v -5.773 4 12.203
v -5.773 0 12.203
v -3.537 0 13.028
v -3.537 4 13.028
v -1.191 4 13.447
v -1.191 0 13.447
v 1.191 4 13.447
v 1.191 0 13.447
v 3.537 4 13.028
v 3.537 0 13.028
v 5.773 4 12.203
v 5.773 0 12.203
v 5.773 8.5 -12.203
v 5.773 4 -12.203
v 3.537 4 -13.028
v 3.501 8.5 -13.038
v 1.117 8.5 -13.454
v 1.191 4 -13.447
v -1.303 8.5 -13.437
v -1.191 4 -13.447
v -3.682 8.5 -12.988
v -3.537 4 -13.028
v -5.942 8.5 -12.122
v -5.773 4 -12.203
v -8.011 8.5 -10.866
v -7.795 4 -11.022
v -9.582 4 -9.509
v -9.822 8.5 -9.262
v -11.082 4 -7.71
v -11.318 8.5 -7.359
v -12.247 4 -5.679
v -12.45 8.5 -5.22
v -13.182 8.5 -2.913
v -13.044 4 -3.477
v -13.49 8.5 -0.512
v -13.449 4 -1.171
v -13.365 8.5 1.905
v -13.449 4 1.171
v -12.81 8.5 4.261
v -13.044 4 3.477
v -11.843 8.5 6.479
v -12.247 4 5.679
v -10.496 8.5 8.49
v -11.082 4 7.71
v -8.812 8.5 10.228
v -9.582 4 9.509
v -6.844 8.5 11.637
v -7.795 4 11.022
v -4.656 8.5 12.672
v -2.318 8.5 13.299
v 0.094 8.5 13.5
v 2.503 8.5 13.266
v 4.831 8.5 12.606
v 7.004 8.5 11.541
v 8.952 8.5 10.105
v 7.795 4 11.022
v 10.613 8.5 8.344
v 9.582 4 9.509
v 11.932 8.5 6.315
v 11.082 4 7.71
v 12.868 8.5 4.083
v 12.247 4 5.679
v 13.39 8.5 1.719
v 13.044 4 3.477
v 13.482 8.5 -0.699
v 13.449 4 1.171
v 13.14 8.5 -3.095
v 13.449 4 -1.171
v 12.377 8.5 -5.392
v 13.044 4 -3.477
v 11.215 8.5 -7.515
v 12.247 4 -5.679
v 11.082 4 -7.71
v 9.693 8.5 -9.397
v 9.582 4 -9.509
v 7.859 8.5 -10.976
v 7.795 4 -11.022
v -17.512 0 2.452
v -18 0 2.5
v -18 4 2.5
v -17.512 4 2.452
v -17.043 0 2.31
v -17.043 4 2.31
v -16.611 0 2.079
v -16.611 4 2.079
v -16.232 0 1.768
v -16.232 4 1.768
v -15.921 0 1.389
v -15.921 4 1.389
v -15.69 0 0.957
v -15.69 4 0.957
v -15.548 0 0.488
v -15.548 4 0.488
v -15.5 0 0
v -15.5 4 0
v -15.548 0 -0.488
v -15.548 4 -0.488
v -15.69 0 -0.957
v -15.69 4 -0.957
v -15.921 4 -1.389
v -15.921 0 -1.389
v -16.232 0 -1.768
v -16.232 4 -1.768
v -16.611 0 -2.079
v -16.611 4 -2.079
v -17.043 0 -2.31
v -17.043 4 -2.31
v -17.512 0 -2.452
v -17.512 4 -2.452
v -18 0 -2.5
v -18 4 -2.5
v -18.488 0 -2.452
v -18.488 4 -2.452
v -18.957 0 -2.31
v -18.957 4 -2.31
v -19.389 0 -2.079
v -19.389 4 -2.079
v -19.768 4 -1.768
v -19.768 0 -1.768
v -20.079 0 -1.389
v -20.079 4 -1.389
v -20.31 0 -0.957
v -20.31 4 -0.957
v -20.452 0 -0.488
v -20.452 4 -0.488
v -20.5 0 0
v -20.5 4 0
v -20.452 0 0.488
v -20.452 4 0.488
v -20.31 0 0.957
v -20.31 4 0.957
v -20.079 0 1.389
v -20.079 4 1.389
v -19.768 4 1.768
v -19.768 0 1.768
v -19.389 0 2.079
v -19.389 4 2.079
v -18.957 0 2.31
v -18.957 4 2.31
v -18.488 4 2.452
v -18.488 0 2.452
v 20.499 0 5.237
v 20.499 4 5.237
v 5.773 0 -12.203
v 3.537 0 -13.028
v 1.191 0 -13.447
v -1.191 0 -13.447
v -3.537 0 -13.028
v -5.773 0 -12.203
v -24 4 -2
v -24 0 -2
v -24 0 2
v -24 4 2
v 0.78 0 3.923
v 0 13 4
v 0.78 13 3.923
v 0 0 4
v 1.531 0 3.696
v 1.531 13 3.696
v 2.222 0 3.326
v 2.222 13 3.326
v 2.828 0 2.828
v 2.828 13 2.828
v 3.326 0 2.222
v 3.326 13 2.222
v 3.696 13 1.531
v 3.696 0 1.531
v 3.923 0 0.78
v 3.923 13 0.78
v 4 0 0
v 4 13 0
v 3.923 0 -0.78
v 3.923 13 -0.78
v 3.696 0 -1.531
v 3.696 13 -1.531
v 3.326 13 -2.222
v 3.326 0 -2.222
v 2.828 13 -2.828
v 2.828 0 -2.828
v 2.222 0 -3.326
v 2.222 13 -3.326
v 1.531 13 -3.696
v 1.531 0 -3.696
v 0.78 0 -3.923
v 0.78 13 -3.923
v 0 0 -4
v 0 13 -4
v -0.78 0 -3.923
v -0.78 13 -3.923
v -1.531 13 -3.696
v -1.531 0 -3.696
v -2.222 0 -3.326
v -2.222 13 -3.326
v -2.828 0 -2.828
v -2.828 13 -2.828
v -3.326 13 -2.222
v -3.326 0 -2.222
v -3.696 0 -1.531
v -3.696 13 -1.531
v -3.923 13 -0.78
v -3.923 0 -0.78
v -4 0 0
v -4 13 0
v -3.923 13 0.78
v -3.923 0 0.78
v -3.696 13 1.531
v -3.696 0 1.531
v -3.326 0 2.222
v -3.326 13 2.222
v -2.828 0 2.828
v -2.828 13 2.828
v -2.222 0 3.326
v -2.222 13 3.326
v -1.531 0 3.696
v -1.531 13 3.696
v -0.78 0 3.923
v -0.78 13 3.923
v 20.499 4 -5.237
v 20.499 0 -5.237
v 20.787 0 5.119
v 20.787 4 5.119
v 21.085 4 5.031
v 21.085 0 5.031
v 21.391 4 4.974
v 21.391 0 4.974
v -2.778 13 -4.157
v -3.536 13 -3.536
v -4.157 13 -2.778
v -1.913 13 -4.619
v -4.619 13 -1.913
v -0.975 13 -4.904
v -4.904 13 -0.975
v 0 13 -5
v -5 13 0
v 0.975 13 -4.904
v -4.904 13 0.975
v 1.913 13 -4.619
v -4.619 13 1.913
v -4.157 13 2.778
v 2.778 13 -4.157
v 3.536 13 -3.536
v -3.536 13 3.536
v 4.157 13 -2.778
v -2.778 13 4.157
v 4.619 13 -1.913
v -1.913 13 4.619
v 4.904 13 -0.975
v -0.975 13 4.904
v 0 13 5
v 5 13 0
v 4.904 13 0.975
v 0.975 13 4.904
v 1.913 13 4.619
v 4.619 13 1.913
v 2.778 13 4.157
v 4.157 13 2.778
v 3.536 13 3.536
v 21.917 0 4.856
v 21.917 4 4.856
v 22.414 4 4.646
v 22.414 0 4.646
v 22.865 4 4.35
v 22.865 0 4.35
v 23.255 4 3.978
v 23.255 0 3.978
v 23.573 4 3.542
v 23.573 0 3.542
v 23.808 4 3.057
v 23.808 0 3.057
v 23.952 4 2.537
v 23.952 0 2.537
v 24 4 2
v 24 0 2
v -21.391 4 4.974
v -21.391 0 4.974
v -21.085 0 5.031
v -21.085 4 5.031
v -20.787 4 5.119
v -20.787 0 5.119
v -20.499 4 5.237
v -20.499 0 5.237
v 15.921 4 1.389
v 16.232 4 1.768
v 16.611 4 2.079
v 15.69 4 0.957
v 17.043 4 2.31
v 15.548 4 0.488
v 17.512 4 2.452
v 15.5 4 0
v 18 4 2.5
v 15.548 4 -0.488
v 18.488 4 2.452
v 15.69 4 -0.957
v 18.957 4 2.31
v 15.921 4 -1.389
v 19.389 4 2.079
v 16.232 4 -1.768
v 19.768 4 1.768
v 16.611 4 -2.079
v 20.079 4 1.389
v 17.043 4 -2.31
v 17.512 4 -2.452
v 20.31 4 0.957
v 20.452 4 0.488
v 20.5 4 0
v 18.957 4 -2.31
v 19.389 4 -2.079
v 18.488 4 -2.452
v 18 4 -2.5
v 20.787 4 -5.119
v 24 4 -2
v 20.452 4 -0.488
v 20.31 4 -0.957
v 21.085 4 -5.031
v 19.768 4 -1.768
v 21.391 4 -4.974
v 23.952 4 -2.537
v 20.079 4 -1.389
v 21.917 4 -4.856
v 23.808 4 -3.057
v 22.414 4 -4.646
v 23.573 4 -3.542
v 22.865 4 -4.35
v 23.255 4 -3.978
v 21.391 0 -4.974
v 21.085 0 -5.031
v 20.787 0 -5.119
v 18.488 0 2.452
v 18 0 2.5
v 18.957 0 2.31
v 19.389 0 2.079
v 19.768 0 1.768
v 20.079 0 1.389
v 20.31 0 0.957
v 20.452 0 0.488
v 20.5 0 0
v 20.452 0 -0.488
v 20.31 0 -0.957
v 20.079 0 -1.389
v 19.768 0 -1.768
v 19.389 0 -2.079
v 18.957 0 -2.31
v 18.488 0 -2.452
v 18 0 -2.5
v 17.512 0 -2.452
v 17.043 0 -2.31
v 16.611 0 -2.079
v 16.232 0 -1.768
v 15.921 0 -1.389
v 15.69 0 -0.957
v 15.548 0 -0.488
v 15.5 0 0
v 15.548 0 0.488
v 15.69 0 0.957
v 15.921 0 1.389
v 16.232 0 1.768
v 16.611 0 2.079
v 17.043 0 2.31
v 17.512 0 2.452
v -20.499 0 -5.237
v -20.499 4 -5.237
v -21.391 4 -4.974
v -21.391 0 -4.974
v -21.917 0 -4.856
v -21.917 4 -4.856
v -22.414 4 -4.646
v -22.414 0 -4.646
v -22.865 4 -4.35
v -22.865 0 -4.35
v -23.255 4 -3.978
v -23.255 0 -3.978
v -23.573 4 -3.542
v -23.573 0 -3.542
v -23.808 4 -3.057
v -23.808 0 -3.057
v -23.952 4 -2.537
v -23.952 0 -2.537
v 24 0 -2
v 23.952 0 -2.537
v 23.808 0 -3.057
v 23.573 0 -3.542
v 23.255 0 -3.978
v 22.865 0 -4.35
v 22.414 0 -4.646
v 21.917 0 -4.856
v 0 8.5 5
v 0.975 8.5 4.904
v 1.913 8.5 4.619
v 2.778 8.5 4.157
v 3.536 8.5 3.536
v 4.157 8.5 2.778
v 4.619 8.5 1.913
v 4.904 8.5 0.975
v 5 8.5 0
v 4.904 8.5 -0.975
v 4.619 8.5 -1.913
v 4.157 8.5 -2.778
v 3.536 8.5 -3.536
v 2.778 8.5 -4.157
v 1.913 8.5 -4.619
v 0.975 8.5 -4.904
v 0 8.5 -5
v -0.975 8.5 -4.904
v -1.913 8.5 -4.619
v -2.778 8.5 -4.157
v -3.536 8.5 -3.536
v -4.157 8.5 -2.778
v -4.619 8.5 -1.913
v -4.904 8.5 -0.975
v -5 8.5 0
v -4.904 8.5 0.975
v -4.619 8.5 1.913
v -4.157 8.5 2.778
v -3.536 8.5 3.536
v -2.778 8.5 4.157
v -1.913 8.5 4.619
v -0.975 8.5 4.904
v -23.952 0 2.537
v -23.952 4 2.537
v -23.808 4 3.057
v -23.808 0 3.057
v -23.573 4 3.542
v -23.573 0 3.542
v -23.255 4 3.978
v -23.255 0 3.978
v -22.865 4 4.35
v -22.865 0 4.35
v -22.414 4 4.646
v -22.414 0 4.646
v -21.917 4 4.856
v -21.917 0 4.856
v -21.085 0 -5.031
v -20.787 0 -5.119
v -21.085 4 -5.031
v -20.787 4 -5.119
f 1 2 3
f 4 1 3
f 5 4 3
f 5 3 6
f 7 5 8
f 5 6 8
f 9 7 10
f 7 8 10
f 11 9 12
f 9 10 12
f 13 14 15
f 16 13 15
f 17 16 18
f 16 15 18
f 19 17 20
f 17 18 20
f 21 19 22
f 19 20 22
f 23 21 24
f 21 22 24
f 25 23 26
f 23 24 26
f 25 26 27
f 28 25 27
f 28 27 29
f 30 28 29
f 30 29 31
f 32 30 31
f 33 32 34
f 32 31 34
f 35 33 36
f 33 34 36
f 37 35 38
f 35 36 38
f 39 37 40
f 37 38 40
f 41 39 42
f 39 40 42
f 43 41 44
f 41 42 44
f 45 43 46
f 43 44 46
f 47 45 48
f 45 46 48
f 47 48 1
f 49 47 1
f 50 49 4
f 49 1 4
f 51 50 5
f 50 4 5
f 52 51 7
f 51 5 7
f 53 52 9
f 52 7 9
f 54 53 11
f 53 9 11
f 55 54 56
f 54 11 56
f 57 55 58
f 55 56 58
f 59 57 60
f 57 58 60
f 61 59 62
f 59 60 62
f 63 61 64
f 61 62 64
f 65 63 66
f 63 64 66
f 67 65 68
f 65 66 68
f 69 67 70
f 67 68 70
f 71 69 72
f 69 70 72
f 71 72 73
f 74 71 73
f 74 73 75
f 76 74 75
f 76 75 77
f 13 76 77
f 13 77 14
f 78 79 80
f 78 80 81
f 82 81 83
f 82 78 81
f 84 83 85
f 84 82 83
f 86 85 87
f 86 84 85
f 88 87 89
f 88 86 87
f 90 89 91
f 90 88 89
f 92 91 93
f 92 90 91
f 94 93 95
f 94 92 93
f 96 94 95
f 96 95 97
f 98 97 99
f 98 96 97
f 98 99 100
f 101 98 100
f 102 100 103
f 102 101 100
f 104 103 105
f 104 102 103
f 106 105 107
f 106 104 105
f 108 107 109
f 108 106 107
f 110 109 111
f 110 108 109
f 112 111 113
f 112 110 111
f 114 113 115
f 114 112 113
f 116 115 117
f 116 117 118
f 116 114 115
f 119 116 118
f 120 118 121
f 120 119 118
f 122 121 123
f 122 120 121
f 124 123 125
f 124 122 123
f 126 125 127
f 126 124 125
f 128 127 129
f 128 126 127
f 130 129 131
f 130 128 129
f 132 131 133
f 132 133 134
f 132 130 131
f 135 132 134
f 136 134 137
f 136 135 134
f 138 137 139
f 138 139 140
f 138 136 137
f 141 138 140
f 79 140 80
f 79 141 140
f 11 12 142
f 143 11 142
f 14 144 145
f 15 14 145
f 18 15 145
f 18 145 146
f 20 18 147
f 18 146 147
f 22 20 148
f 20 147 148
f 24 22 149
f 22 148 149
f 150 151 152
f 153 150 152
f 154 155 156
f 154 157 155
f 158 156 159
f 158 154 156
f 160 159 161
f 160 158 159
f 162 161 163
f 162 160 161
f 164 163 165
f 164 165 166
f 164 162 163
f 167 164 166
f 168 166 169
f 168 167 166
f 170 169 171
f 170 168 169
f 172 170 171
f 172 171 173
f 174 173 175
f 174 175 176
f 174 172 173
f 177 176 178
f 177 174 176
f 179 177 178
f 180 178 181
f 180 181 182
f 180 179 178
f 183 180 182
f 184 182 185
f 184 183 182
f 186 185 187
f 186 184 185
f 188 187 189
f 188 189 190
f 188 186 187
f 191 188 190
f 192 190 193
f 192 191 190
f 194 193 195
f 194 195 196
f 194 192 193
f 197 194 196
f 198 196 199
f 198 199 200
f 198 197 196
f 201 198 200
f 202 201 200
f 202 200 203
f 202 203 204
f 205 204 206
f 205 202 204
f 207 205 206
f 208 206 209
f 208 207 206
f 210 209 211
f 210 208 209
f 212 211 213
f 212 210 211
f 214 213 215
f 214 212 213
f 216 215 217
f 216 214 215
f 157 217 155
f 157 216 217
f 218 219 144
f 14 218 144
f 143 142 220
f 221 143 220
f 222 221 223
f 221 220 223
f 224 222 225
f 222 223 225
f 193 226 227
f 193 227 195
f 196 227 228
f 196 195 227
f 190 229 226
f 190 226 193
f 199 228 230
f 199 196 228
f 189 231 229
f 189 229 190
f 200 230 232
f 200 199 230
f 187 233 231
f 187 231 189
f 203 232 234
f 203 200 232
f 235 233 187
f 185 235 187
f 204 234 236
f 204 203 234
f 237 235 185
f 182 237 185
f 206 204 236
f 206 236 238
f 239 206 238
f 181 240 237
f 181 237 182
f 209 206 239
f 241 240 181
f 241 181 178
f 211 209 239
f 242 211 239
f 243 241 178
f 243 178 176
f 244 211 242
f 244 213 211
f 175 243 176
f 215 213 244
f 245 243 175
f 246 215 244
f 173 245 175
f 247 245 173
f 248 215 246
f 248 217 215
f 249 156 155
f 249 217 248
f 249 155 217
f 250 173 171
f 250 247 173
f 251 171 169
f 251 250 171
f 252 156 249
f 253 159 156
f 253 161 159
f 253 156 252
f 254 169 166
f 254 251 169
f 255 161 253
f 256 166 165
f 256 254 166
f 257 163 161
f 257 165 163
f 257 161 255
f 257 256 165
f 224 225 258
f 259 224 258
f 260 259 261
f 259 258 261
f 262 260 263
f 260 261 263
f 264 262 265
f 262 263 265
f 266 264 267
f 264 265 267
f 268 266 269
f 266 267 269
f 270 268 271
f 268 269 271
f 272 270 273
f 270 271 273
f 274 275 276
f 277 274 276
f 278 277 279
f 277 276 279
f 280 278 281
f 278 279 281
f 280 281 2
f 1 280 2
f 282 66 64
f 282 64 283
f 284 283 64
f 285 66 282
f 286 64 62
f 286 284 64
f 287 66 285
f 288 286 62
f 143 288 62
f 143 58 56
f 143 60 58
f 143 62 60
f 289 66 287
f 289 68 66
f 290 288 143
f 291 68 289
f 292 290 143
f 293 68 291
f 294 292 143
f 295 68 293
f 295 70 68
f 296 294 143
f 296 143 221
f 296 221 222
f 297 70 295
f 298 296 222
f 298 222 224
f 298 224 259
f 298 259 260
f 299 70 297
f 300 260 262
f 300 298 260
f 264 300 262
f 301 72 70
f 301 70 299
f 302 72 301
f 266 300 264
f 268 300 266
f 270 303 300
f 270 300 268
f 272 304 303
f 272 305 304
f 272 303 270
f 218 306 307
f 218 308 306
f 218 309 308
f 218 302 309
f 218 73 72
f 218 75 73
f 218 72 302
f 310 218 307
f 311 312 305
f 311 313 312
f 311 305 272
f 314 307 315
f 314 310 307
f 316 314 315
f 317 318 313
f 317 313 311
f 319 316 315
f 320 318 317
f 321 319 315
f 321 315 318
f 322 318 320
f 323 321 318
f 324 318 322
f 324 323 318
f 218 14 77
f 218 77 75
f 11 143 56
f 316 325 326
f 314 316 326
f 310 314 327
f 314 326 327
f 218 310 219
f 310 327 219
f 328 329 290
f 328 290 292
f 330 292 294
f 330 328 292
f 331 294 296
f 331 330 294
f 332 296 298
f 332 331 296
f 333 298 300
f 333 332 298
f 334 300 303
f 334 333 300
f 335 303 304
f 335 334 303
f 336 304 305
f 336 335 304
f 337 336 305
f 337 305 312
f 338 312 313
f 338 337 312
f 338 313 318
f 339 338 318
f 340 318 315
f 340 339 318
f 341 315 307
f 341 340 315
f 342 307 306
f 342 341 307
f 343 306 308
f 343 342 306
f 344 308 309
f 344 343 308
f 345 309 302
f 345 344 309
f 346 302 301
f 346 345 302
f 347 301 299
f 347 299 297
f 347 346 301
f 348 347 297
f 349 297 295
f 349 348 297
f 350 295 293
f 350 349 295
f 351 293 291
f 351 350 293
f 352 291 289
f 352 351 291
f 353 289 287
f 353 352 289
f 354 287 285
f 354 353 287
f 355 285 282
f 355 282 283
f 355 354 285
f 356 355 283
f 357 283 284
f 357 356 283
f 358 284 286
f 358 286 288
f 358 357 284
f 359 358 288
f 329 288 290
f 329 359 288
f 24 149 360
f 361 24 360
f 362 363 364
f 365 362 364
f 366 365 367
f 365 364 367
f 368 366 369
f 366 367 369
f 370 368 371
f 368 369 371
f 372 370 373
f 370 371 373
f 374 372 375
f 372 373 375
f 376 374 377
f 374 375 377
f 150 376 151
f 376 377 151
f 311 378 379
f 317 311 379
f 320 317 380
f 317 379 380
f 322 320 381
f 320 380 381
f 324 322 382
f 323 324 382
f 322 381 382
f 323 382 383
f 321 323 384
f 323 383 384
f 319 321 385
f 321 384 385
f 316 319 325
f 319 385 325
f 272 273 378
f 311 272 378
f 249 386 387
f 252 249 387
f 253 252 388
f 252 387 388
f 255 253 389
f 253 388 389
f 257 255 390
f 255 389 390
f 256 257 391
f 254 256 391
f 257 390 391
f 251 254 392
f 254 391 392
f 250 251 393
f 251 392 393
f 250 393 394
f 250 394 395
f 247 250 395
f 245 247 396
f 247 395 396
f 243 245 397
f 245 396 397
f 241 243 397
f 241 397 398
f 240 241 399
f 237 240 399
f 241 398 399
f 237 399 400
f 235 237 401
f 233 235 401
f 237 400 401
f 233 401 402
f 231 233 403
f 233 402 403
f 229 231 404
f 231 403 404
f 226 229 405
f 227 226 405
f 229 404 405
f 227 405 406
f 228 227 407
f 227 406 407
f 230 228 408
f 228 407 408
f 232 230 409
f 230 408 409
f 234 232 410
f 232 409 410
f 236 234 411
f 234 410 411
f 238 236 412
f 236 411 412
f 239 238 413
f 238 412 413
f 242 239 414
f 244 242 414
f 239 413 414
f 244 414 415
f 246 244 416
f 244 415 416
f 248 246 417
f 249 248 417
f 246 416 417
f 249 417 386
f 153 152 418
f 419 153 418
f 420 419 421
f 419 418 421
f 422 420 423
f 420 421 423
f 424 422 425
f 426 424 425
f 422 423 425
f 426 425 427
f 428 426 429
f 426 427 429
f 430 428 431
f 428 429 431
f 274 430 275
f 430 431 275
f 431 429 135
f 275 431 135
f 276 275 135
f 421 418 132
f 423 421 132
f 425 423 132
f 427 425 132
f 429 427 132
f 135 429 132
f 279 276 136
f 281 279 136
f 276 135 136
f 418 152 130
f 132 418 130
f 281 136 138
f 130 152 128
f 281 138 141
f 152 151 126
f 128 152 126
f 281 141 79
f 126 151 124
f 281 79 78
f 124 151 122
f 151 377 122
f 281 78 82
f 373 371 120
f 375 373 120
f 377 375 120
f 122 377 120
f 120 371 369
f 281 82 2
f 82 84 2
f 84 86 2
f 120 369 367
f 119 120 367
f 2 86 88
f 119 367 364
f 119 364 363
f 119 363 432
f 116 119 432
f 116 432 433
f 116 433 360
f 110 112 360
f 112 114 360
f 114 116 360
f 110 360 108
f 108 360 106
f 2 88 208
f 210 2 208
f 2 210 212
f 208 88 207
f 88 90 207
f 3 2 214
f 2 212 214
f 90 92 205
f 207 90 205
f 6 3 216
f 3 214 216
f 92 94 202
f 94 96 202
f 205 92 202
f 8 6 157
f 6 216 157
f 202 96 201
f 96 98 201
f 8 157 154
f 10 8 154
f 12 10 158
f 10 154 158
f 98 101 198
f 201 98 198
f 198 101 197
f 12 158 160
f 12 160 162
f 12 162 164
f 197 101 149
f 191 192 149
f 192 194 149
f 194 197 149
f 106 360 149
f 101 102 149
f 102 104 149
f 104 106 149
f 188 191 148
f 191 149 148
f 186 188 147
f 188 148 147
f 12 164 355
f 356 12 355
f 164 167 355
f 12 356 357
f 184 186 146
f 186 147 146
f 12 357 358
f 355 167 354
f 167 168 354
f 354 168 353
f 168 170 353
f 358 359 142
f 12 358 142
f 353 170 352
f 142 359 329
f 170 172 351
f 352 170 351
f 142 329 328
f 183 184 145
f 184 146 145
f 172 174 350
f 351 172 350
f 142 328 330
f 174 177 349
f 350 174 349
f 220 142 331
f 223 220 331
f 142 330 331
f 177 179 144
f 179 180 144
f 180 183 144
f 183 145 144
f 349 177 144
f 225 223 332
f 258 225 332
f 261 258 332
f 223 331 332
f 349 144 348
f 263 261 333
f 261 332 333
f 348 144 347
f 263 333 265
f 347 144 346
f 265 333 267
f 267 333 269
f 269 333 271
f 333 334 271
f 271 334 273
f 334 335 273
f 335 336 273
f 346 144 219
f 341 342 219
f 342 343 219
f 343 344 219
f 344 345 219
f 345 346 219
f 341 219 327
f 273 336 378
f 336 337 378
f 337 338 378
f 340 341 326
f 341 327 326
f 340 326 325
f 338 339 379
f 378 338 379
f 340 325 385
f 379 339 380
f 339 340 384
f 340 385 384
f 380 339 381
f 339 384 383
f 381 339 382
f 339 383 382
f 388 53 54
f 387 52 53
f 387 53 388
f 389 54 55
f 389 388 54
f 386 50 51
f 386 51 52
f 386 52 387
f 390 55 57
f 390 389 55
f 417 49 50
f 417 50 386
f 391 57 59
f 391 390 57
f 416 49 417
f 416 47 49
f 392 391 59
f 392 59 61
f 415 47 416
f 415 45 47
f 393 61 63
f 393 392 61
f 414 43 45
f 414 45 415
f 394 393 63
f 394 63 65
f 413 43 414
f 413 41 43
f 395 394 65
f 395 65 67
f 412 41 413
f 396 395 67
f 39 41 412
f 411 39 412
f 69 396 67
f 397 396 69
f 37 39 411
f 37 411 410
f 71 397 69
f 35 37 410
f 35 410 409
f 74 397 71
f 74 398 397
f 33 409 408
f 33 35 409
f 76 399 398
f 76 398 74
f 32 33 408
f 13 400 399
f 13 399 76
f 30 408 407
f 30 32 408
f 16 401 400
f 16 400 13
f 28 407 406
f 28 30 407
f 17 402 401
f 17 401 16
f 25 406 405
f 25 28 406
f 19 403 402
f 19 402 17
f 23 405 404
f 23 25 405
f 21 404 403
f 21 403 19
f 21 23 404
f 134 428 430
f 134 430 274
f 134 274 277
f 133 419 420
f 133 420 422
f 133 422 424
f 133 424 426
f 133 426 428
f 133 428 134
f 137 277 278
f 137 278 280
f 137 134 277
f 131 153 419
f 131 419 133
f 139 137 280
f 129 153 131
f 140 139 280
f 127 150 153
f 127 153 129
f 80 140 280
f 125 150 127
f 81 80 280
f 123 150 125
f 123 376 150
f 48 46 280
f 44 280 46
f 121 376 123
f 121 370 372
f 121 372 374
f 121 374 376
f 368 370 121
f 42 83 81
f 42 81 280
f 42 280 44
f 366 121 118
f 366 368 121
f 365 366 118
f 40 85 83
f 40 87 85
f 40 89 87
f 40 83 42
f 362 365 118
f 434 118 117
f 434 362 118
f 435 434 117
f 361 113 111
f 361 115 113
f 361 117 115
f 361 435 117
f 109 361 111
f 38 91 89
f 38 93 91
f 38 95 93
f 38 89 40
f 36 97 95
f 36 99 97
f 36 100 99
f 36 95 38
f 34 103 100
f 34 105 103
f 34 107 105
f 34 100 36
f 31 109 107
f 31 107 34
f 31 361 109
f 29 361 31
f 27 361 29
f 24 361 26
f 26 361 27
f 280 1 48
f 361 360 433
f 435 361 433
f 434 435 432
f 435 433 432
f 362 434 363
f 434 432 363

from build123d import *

# Parameters (mm, degrees)
SKETCH_1_R      = 2.5
SKETCH_1_R_2    = 4
EXTRUDE_1_DEPTH = 4
SKETCH_2_R      = 13.5
SKETCH_2_R_2    = 4
EXTRUDE_2_DEPTH = 4.5
SKETCH_3_R      = 5
SKETCH_3_R_2    = 4
EXTRUDE_3_DEPTH = 4.5


with BuildPart() as part:
    # 草图1 → 凸台-拉伸1 (new body)
    with BuildSketch(Plane(origin=(0, 0, 0), x_dir=(1, 0, 0), z_dir=(0, 1, 0))):
        with BuildLine():
            Line((-5.773005503, 12.203376888), (-20.499093296, 5.236962046))
            ThreePointArc((-20.499093296, 5.236962046), (-20.934809728, 5.070925602), (-21.390991704, 4.974411789))
            ThreePointArc((-21.390991704, 4.974411789), (-23.255324268, 3.978259954), (-24, 2))
            Line((-24, 2), (-24, -2))
            ThreePointArc((-24, -2), (-23.255324268, -3.978259954), (-21.390991704, -4.974411789))
            ThreePointArc((-21.390991704, -4.974411789), (-20.934809728, -5.070925602), (-20.499093296, -5.236962046))
            Line((-20.499093296, -5.236962046), (-5.773005503, -12.203376888))
            ThreePointArc((-5.773005503, -12.203376888), (0, -13.5), (5.773005503, -12.203376888))
            Line((5.773005503, -12.203376888), (20.499093296, -5.236962046))
            ThreePointArc((20.499093296, -5.236962046), (20.934809728, -5.070925602), (21.390991704, -4.974411789))
            ThreePointArc((21.390991704, -4.974411789), (23.255324268, -3.978259954), (24, -2))
            Line((24, -2), (24, 2))
            ThreePointArc((24, 2), (23.255324268, 3.978259954), (21.390991704, 4.974411789))
            ThreePointArc((21.390991704, 4.974411789), (20.934809728, 5.070925602), (20.499093296, 5.236962046))
            Line((20.499093296, 5.236962046), (5.773005503, 12.203376888))
            ThreePointArc((5.773005503, 12.203376888), (0, 13.5), (-5.773005503, 12.203376888))
        make_face()
        with Locations(Location((-18, 0, 0), (0, 0, 270))):
            Circle(SKETCH_1_R, mode=Mode.SUBTRACT)
        with Locations(Location((0, 0, 0), (0, 0, 270))):
            Circle(SKETCH_1_R_2, mode=Mode.SUBTRACT)
        with Locations(Location((18, 0, 0), (0, 0, 270))):
            Circle(SKETCH_1_R, mode=Mode.SUBTRACT)
    extrude(amount=EXTRUDE_1_DEPTH)

    # 草图2 → 凸台-拉伸2 (add)
    with BuildSketch(Plane(origin=(0, 4, 0), x_dir=(1, 0, 0), z_dir=(0, 1, 0))):
        with Locations(Location((0, 0, 0), (0, 0, 64.68274989))):
            Circle(SKETCH_2_R)
        with Locations(Location((0, 0, 0), (0, 0, 270))):
            Circle(SKETCH_2_R_2, mode=Mode.SUBTRACT)
    extrude(amount=EXTRUDE_2_DEPTH)

    # 草图3 → 凸台-拉伸3 (add)
    with BuildSketch(Plane(origin=(0, 8.5, 0), x_dir=(1, 0, 0), z_dir=(0, 1, 0))):
        with Locations(Location((0, 0, 0), (0, 0, 270))):
            Circle(SKETCH_3_R)
        with Locations(Location((0, 0, 0), (0, 0, 270))):
            Circle(SKETCH_3_R_2, mode=Mode.SUBTRACT)
    extrude(amount=EXTRUDE_3_DEPTH)


solid = part.part
